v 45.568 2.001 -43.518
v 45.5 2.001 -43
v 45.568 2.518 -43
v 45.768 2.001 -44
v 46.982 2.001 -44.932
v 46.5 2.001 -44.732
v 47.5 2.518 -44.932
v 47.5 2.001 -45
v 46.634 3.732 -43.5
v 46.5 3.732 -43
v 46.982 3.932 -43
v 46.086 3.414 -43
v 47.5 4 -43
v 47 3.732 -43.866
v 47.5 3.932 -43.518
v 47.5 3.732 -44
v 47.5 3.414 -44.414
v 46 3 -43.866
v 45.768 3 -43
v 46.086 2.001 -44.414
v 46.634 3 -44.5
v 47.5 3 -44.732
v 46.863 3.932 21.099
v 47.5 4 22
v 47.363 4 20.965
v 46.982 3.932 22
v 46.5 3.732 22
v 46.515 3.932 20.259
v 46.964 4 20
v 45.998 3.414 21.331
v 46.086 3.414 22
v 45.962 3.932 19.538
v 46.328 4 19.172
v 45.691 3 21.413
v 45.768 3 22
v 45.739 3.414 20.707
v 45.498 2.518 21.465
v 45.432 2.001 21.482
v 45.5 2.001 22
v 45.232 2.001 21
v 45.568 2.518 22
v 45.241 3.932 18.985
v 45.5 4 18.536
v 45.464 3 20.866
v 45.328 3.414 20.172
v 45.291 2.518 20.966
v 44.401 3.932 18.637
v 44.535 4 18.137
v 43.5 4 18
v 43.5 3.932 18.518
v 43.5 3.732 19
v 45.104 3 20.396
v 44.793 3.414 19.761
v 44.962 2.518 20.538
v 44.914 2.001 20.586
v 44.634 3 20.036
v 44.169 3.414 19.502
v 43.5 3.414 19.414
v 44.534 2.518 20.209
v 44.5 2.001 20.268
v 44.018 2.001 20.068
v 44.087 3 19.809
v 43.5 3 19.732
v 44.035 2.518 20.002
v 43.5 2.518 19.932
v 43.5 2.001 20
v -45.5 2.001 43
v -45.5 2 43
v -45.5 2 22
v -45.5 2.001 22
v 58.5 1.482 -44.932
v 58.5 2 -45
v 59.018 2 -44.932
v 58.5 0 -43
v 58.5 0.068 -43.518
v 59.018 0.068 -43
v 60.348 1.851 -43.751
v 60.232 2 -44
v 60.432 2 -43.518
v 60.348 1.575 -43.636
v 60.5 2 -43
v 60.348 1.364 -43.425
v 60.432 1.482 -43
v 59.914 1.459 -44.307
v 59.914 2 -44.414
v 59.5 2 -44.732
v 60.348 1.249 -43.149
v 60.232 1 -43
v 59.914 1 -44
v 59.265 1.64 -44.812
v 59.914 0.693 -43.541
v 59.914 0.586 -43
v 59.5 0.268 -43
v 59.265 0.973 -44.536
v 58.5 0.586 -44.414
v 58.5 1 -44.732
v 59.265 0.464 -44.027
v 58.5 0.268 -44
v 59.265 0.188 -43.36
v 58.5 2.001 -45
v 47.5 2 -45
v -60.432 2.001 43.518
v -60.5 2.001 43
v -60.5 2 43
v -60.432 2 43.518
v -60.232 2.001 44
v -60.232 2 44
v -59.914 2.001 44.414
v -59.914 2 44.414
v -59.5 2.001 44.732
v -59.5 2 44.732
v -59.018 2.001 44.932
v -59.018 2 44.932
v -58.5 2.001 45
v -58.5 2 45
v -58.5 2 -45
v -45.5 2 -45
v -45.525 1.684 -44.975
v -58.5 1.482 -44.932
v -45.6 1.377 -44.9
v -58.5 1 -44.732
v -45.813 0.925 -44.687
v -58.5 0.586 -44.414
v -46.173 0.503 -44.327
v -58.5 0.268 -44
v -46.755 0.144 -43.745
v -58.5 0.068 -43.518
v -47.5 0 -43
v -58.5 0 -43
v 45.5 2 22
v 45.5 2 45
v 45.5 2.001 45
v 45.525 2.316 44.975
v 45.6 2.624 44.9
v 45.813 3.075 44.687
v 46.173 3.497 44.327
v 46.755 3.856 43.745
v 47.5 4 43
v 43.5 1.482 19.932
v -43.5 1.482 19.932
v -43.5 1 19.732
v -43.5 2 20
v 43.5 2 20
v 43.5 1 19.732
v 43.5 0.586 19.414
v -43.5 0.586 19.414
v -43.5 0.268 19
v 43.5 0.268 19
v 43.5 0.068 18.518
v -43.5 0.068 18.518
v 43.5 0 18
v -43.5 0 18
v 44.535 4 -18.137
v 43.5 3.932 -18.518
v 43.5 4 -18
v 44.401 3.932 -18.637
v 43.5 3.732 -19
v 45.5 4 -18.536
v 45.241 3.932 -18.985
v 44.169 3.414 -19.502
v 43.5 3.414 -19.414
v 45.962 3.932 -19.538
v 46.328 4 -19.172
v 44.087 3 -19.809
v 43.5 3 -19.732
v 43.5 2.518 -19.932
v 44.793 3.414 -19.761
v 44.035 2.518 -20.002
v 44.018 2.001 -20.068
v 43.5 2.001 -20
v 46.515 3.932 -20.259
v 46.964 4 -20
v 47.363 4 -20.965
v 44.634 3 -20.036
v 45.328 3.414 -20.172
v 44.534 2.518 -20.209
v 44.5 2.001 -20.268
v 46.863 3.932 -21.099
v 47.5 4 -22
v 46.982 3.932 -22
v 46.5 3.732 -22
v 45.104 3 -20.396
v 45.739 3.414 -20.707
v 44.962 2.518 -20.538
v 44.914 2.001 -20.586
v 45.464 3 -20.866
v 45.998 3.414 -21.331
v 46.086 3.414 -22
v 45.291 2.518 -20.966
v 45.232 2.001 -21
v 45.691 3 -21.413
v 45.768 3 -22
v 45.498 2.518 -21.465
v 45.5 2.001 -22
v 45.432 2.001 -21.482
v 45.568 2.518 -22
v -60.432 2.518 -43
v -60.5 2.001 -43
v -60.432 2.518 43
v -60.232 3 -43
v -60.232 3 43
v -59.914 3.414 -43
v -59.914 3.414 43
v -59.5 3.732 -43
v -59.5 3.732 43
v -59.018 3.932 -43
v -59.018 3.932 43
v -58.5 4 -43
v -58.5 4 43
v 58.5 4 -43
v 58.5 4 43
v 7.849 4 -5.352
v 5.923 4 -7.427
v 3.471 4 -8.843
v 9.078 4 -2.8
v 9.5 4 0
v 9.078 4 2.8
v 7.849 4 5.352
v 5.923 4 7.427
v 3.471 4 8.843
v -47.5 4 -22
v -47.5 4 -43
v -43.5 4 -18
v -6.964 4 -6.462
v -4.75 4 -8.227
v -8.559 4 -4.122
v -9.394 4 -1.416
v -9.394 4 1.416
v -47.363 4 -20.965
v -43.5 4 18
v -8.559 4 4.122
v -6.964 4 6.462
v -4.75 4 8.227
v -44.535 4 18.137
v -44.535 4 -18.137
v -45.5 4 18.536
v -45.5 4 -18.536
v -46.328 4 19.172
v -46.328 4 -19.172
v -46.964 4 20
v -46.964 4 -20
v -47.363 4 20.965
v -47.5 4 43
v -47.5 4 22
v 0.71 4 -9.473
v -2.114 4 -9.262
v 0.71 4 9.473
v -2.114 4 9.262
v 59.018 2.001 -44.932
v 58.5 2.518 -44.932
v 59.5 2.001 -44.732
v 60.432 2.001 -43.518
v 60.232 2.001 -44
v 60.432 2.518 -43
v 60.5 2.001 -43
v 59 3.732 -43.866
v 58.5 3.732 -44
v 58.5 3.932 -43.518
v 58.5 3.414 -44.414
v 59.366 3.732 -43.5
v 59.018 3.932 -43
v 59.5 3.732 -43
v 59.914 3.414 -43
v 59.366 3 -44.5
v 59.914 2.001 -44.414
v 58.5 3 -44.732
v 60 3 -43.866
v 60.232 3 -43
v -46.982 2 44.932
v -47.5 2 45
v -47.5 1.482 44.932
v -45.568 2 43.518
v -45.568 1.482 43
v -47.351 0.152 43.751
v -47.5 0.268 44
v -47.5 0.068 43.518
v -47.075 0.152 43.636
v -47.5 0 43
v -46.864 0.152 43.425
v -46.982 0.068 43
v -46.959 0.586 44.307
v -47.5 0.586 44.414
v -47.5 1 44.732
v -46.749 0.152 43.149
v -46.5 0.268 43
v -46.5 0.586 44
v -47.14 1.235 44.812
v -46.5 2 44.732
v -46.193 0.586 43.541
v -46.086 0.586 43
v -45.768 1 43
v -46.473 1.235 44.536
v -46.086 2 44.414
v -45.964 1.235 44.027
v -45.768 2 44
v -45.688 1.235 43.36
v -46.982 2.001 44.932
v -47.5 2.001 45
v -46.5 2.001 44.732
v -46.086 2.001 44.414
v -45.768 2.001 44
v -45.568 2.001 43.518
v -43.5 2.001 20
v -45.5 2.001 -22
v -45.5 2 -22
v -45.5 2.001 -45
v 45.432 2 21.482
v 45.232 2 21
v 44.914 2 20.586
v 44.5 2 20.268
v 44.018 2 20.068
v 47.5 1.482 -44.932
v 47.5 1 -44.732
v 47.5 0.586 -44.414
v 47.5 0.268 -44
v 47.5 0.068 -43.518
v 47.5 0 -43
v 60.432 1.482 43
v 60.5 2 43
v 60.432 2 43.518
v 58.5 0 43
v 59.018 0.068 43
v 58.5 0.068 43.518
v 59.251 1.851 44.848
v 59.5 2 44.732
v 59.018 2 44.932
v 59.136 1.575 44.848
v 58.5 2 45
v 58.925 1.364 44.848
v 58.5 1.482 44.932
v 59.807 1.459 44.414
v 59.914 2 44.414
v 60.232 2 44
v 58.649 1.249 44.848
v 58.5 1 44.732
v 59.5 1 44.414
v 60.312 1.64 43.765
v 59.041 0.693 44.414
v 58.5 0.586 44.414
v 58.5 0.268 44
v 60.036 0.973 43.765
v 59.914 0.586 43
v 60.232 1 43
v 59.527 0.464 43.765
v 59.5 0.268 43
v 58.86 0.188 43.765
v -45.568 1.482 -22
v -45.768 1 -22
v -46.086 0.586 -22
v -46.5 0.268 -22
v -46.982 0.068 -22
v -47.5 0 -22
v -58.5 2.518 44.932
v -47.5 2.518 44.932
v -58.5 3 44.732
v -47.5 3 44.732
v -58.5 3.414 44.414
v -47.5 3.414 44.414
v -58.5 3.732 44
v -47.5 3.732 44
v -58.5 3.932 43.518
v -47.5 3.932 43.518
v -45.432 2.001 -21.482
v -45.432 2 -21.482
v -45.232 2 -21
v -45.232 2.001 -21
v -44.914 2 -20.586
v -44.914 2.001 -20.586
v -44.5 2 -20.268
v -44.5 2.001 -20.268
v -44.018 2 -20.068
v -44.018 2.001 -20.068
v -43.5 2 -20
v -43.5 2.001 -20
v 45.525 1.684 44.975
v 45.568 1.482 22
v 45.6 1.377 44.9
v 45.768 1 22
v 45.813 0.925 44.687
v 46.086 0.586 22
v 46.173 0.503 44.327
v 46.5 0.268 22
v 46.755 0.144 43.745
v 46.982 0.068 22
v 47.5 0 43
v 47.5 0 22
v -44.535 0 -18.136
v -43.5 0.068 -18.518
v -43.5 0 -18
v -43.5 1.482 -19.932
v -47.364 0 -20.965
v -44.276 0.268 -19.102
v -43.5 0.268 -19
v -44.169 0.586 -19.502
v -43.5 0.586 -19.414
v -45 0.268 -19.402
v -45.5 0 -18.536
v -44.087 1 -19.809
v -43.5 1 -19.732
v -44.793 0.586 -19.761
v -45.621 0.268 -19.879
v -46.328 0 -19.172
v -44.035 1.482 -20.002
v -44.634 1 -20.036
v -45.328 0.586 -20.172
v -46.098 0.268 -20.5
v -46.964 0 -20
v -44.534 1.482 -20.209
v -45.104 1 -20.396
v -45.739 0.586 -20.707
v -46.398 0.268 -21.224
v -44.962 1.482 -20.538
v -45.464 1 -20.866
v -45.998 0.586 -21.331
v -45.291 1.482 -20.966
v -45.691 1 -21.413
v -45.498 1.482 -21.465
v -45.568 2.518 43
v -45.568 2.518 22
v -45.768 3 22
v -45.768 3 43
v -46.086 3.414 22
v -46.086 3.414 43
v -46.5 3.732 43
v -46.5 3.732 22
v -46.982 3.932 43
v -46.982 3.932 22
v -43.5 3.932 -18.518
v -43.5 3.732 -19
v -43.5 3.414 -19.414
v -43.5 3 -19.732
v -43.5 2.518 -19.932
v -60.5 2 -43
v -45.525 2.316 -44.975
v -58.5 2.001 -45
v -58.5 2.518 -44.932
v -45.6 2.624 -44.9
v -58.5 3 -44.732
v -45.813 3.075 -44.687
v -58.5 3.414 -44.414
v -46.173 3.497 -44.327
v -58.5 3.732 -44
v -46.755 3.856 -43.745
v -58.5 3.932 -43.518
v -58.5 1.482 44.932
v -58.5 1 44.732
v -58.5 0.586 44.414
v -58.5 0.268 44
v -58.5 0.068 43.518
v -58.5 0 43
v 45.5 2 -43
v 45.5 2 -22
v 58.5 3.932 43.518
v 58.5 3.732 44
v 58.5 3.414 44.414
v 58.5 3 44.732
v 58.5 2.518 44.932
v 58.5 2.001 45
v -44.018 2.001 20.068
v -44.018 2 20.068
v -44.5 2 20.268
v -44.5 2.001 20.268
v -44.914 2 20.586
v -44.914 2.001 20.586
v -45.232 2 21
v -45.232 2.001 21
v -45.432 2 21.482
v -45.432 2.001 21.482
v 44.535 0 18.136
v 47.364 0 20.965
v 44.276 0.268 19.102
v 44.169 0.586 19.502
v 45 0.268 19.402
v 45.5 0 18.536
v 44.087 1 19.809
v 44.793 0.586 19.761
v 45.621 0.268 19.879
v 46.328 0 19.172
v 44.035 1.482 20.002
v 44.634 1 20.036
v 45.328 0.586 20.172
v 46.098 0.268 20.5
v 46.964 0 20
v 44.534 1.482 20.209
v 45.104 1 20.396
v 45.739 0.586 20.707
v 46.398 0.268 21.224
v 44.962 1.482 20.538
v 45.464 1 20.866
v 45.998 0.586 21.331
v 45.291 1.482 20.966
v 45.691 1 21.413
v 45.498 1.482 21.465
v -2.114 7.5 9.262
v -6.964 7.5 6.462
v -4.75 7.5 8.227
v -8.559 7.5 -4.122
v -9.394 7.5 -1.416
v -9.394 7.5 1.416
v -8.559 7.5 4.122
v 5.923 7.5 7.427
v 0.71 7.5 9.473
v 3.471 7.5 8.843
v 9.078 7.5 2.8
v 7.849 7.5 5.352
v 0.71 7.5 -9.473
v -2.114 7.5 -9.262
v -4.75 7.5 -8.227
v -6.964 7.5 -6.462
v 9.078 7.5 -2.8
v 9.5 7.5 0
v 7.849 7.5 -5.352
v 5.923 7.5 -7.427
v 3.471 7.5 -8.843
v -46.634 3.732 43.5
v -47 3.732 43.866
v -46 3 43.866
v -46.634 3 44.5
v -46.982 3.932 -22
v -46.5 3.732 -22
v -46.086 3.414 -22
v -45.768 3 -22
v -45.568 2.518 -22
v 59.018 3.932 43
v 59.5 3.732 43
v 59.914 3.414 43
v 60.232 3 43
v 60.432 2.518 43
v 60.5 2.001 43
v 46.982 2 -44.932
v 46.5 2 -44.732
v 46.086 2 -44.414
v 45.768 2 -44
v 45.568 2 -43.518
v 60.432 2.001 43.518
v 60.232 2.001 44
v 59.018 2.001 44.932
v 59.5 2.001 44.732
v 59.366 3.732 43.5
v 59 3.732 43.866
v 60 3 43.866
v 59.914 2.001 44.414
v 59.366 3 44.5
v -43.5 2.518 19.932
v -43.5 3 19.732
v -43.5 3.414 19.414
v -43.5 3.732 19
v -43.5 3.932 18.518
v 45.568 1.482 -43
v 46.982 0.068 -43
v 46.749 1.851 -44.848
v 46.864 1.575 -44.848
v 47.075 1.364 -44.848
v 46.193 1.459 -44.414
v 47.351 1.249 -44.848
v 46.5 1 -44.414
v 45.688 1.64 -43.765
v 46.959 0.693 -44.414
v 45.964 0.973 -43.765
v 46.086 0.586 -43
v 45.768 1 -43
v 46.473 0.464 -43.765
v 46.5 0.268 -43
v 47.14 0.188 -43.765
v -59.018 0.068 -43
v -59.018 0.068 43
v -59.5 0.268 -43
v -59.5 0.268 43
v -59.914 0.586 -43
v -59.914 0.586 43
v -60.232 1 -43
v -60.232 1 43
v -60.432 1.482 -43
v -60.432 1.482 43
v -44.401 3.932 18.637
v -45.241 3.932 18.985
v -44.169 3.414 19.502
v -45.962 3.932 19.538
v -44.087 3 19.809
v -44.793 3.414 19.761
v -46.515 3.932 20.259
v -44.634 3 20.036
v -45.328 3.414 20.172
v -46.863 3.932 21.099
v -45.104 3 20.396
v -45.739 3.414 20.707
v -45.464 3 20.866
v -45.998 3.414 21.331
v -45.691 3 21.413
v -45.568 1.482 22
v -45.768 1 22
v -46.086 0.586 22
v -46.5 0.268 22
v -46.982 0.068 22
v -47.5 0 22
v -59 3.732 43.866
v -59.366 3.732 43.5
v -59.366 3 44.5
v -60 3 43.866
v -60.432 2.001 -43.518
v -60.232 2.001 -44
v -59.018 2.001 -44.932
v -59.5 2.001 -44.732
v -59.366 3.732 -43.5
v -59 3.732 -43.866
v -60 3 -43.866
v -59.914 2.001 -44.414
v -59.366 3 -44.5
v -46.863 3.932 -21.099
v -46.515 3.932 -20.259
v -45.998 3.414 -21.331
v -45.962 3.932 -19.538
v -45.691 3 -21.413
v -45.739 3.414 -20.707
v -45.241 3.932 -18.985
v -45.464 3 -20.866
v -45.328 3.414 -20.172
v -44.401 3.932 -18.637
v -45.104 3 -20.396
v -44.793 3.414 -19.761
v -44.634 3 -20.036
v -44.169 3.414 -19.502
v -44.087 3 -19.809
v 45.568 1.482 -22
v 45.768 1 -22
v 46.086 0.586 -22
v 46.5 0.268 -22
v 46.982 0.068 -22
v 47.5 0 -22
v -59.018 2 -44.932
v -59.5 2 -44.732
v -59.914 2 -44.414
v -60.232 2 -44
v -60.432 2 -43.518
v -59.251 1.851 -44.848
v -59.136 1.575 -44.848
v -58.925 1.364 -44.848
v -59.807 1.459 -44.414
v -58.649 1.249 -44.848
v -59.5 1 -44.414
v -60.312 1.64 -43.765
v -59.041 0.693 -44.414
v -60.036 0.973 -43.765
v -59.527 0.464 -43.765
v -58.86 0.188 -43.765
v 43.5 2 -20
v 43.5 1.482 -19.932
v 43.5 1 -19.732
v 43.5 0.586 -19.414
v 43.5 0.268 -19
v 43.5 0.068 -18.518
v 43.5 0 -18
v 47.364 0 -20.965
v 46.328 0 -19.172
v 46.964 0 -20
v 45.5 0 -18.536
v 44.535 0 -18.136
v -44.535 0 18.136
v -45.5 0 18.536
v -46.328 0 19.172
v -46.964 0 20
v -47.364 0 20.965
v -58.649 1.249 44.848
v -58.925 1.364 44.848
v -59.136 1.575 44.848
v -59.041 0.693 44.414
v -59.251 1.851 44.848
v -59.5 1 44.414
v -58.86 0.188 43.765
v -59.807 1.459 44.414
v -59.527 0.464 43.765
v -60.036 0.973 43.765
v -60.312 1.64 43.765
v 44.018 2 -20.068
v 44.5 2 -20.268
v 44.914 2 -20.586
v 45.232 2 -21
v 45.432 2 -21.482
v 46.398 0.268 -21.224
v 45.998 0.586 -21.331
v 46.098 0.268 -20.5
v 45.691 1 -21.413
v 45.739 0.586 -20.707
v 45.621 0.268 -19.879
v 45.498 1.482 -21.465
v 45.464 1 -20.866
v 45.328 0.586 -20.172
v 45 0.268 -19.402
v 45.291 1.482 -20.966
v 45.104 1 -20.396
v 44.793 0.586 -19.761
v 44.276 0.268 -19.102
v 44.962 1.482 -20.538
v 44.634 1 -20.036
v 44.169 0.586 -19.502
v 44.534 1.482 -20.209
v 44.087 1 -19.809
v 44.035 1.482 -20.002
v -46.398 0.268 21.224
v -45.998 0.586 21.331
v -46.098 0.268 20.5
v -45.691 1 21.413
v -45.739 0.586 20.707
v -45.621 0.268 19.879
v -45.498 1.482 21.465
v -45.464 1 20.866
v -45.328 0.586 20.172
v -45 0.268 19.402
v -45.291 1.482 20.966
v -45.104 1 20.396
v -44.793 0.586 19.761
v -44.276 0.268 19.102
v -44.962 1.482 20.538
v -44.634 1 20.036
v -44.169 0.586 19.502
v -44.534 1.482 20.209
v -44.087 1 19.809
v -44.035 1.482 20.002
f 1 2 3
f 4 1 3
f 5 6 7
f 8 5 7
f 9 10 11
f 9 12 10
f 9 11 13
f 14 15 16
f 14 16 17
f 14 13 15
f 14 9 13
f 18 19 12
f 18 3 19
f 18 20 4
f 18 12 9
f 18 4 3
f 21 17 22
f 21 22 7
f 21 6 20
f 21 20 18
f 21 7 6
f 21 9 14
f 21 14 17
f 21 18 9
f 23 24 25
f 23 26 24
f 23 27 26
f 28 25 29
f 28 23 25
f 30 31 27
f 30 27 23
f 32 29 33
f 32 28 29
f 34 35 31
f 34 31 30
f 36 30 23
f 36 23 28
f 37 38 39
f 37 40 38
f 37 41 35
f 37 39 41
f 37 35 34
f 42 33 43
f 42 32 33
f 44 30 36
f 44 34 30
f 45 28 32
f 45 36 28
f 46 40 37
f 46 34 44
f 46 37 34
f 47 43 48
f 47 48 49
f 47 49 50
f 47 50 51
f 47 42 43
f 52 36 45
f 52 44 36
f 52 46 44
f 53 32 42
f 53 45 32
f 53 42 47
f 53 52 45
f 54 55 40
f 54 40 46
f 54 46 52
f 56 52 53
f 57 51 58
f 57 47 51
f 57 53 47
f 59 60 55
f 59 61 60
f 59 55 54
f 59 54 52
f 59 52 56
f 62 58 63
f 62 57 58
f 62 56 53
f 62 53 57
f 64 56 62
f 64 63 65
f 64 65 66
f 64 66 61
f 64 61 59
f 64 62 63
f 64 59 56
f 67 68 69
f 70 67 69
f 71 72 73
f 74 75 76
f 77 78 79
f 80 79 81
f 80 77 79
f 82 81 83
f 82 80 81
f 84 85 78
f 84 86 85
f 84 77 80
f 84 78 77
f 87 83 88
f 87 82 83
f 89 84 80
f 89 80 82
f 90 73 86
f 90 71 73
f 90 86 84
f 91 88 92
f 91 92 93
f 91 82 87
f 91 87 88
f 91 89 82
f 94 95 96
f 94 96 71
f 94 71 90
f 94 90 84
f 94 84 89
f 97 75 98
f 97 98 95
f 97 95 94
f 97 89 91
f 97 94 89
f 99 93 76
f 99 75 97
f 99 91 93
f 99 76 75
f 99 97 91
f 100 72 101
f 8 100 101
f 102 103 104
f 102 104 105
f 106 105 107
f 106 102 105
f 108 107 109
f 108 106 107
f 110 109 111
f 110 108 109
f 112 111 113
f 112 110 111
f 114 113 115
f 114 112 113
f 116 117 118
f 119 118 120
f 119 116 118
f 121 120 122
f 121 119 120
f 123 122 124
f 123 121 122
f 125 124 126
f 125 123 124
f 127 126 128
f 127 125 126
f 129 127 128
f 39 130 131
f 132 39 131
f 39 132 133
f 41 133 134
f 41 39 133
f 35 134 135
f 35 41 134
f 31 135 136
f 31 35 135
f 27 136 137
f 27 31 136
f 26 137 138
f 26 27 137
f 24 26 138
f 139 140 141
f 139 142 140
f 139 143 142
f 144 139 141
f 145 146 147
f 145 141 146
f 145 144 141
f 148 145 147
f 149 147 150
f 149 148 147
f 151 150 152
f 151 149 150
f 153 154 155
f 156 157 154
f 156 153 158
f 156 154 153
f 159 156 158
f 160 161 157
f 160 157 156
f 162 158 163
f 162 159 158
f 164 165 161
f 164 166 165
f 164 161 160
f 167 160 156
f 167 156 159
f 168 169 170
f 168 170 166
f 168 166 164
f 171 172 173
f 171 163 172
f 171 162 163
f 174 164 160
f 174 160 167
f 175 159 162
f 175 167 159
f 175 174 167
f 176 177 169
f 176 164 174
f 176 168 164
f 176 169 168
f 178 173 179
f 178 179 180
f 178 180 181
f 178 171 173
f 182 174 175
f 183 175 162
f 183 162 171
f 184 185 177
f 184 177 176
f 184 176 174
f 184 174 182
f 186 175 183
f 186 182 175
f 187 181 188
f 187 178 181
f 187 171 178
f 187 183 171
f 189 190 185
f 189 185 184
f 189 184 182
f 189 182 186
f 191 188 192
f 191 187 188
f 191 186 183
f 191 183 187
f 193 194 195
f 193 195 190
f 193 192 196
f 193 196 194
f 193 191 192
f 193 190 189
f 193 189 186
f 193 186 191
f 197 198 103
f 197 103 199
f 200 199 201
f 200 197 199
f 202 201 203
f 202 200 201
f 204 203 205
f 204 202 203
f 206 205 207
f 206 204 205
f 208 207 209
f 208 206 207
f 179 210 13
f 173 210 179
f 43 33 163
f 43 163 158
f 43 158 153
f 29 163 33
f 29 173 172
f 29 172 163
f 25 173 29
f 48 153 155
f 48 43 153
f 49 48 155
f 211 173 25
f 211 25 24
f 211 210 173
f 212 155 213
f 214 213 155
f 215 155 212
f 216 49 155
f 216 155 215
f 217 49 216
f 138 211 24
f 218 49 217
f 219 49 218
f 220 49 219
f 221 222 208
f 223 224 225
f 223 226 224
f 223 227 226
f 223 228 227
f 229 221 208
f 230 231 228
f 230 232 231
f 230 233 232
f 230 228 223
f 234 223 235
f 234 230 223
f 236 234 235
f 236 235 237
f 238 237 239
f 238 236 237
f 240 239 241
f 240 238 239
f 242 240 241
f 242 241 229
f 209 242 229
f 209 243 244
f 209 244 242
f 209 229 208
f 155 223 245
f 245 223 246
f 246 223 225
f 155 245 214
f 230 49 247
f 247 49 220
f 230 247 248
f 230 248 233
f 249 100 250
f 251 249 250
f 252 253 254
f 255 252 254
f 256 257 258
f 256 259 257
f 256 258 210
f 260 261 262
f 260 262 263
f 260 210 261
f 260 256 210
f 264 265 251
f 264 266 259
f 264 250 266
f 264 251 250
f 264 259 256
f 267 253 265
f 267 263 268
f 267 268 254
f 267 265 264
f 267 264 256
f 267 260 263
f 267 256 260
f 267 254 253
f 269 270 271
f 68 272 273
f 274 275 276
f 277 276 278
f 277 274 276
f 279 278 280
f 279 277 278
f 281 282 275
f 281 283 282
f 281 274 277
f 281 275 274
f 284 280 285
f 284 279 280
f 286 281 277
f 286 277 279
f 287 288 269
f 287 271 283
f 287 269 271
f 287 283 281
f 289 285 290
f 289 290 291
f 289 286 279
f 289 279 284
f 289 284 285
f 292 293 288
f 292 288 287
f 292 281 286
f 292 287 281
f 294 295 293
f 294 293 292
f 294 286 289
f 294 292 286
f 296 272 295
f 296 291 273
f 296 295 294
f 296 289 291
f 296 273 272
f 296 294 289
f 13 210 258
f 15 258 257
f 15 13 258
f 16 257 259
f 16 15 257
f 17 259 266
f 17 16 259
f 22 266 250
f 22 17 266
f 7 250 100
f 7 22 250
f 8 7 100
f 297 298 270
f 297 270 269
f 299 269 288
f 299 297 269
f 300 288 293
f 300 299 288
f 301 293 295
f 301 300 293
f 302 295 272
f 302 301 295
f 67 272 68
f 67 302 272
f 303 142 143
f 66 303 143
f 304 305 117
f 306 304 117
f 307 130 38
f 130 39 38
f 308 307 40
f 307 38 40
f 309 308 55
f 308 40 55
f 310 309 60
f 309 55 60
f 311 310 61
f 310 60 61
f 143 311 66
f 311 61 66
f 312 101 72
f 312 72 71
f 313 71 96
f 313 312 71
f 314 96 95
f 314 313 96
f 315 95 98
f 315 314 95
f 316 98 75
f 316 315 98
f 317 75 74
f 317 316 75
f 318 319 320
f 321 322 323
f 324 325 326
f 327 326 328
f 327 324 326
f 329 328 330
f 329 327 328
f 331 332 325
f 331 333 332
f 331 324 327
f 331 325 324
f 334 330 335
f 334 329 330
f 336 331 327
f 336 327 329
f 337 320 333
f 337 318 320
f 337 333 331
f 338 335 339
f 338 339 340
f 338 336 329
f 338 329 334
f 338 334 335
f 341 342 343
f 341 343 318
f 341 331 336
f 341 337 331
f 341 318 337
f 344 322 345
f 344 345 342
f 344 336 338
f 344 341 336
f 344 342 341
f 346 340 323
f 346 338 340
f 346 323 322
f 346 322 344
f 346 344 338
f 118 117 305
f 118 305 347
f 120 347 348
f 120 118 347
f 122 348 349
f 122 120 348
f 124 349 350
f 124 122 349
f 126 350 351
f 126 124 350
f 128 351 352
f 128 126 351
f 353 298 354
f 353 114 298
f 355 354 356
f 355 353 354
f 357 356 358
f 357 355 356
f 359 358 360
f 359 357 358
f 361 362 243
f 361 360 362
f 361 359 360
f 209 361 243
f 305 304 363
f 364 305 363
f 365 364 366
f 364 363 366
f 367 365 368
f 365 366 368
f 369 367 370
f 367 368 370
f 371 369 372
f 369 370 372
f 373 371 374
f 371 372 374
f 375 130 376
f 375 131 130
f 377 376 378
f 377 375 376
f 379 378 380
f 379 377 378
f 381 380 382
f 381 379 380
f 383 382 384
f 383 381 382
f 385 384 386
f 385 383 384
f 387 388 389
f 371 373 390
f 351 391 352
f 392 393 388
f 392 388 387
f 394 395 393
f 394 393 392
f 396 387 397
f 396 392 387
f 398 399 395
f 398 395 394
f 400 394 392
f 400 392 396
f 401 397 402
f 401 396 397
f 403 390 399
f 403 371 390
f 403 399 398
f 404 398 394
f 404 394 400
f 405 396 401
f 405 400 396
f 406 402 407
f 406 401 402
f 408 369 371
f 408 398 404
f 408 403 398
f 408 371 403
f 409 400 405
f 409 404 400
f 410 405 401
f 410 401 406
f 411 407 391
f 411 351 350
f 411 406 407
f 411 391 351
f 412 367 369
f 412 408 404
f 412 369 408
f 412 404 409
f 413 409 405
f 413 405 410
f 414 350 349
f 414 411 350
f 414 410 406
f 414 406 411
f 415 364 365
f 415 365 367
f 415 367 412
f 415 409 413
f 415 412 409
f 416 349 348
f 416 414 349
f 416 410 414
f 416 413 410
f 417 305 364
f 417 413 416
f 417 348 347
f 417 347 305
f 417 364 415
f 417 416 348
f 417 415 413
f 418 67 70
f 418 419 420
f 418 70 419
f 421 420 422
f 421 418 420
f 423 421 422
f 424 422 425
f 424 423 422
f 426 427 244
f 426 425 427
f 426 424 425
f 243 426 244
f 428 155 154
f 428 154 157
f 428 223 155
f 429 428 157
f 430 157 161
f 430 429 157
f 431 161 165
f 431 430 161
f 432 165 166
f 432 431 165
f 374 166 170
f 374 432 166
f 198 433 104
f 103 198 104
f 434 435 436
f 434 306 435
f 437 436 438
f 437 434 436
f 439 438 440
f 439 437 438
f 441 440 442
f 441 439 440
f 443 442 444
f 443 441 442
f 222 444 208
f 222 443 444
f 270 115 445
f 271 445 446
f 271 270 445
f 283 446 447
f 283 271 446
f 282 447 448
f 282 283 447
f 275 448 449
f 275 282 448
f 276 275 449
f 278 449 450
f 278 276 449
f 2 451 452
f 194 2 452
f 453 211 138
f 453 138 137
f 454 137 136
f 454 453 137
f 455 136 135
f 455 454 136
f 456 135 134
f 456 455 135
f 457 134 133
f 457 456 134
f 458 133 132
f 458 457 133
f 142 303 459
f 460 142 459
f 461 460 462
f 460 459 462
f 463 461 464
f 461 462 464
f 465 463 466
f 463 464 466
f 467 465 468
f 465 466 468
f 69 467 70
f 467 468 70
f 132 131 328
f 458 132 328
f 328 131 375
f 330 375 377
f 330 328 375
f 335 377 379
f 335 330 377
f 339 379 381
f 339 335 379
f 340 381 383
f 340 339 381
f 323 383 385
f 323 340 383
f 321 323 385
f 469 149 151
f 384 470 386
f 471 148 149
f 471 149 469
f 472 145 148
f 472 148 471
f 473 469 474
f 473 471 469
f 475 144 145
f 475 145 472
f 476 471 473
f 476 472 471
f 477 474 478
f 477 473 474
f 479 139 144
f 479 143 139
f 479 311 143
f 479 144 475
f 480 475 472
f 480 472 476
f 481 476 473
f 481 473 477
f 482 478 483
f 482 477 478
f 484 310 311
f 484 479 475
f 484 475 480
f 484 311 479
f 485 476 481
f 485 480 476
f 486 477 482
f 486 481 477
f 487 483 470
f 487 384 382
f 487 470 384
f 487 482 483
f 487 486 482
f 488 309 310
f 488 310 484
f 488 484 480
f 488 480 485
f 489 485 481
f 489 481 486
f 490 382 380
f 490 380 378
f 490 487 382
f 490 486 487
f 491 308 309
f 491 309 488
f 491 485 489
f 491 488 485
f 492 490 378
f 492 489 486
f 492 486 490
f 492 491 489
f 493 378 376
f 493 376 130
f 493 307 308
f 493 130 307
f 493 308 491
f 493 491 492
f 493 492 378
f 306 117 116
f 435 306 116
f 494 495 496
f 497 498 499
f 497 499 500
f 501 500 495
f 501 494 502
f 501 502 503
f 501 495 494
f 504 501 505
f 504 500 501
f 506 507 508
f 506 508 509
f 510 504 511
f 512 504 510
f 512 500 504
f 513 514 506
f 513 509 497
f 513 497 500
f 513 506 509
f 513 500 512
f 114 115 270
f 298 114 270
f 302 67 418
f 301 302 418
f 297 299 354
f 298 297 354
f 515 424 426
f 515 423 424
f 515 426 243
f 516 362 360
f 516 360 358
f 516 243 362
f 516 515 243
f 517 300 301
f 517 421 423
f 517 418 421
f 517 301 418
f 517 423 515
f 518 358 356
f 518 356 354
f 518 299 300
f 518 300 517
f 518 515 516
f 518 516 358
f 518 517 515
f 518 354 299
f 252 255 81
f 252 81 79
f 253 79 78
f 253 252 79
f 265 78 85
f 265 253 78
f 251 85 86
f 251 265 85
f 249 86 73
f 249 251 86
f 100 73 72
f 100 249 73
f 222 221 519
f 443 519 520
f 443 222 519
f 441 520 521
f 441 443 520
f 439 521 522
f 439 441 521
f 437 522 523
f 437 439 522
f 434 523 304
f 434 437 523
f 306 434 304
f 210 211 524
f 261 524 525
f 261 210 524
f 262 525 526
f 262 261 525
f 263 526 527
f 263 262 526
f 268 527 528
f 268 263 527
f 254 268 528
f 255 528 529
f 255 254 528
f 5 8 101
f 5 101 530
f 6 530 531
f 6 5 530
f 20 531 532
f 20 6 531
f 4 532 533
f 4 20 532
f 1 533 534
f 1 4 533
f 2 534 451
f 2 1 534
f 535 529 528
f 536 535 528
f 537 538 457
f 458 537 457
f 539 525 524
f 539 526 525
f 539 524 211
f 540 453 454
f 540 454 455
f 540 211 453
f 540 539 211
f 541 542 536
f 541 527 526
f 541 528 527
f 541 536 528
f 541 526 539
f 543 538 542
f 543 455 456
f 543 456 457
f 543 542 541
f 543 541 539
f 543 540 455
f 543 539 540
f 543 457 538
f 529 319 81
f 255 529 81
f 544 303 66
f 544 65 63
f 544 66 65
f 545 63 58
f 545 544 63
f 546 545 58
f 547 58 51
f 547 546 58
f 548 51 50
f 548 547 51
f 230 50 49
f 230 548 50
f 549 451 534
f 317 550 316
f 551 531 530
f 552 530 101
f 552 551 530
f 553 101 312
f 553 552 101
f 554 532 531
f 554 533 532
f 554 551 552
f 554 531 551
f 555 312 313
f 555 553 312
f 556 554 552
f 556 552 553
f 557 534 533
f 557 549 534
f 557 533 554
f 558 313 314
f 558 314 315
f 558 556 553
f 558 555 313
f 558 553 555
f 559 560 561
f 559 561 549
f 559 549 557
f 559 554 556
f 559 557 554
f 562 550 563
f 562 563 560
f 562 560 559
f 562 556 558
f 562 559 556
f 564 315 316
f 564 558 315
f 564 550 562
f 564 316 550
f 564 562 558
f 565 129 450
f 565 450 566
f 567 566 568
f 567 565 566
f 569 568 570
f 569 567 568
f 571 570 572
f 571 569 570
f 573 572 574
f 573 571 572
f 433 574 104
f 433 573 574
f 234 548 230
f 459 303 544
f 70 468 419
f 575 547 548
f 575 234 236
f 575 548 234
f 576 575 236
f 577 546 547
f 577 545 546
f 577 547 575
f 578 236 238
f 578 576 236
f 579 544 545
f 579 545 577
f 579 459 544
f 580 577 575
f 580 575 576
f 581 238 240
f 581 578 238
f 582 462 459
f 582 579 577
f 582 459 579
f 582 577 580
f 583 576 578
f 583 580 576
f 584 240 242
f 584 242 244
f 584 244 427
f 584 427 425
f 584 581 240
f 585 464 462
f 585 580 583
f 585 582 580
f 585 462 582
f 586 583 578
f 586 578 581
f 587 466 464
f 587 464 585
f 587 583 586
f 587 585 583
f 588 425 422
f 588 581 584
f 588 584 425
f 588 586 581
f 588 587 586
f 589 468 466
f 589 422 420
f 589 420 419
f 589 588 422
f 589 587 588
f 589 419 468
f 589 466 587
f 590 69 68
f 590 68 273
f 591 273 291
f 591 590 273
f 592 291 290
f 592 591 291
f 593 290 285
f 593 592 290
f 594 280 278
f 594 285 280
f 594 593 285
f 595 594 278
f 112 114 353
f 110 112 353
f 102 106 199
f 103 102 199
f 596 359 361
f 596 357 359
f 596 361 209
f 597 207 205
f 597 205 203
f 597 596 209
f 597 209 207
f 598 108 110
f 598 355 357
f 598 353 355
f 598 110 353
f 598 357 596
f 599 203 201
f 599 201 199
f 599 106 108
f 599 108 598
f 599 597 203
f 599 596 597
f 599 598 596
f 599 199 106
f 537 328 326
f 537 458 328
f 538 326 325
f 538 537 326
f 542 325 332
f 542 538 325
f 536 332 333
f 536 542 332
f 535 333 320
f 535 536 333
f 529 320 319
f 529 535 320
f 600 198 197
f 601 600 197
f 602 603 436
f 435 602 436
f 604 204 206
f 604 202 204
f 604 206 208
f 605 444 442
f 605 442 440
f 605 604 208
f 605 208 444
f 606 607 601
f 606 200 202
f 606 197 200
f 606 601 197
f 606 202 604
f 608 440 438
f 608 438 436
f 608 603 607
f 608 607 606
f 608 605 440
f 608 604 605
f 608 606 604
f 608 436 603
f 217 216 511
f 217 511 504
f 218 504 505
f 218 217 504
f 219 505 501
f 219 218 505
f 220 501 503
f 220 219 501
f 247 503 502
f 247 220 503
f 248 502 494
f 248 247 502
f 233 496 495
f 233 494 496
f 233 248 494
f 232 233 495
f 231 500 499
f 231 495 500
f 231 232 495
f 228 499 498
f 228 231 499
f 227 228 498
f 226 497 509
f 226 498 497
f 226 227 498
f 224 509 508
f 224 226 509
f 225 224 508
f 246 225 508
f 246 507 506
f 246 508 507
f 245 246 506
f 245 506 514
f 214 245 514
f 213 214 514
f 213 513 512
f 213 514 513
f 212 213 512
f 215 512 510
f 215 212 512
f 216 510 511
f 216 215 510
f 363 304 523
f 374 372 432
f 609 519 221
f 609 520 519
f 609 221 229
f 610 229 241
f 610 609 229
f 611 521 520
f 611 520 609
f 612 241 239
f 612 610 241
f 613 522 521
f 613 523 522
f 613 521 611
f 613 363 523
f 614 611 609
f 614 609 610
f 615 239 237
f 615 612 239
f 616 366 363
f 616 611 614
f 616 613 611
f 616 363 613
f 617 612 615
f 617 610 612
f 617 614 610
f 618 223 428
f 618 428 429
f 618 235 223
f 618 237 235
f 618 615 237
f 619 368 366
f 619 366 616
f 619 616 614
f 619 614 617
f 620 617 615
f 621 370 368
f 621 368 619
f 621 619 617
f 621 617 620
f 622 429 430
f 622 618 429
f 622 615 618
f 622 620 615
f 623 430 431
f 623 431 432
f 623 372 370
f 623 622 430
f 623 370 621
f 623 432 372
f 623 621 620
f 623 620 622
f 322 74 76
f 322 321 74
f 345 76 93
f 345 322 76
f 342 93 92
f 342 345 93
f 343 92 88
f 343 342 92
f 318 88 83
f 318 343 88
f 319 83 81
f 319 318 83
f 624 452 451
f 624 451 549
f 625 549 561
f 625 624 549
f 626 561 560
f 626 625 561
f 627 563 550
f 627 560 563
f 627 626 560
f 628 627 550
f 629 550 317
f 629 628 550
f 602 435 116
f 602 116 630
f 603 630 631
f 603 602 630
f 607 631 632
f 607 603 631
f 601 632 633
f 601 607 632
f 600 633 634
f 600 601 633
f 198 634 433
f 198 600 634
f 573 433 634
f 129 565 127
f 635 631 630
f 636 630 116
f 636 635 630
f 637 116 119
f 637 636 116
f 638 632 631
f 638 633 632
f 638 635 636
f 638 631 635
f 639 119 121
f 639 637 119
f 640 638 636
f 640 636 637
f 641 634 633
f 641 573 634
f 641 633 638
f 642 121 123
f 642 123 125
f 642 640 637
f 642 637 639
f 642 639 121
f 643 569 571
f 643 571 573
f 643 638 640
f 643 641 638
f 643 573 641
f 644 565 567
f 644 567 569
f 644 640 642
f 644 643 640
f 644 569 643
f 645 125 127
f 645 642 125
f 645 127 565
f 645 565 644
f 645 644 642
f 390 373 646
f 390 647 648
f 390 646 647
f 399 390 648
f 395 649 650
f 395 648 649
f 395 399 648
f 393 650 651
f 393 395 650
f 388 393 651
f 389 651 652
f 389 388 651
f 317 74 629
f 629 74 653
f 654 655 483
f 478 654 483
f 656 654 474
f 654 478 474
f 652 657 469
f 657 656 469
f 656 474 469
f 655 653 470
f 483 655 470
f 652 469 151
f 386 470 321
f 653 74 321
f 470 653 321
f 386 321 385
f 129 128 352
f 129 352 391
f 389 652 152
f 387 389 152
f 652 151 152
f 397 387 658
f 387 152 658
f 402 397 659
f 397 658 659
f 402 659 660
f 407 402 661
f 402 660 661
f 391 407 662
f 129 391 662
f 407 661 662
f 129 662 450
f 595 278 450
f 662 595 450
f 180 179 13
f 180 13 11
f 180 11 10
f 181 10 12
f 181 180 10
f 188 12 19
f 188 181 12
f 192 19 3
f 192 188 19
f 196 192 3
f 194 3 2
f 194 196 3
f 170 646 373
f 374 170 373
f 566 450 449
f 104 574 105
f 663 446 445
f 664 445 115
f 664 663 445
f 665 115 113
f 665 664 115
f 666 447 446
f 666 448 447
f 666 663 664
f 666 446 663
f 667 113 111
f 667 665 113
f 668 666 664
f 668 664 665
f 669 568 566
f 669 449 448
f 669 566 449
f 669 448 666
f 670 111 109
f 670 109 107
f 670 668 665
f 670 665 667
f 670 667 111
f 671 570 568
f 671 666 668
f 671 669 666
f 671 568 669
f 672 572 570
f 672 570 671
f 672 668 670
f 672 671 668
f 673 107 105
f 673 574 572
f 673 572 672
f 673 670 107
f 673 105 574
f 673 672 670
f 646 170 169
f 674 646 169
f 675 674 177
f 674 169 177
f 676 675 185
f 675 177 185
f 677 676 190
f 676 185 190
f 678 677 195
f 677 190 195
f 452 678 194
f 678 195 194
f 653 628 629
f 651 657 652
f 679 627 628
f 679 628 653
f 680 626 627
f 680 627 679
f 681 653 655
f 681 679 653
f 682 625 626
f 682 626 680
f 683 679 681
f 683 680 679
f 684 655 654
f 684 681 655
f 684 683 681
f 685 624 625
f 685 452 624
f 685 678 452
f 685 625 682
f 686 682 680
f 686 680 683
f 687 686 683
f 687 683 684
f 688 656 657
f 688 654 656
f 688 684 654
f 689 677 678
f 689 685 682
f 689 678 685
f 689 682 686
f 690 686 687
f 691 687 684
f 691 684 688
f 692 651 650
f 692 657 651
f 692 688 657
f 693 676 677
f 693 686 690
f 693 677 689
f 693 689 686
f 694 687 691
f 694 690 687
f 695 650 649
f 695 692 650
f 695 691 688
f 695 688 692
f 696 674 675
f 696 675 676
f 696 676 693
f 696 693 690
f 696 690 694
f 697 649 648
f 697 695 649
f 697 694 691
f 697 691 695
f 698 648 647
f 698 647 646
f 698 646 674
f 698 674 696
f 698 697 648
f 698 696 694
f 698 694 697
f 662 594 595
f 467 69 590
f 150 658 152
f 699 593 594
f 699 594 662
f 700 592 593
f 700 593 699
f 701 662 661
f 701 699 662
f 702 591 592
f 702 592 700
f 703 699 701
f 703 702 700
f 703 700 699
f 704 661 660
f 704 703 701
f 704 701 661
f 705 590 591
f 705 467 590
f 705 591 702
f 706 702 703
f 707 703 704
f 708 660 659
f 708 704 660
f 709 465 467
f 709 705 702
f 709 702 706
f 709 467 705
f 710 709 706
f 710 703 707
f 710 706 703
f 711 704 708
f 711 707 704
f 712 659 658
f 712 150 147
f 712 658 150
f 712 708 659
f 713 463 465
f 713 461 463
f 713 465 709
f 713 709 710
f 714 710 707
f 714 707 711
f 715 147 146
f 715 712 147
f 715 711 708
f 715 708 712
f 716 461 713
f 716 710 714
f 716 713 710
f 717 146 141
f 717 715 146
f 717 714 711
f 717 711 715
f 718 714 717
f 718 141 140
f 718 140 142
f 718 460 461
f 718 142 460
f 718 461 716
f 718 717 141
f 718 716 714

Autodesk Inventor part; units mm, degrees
ref_plane "YZ Plane" through (0, 0, 0) normal (1, 0, 0) x (0, 1, 0)
ref_plane "XZ Plane" through (0, 0, 0) normal (0, 1, 0) x (-1, 0, 0)
ref_plane "XY Plane" through (0, 0, 0) normal (0, 0, 1) x (1, 0, 0)
sketch "Sketch1" plane through (0, 0, 0) normal (0, 1, 0) x (-1, 0, 0)
  line L0 (-45.5, -20) -> (45.5, -20)
  line L1 (60.5, -20) -> (60.5, 20)
  line L2 (45.5, 20) -> (-45.5, 20)
  line L3 (-60.5, 20) -> (-60.5, -20)
  line L4 (-60.5, -20) -> (60.5, 20) construction
  line L5 (60.5, -20) -> (-60.5, 20) construction
  line L6 (-60.5, -45) -> (60.5, -45) construction
  line L7 (60.5, -45) -> (60.5, 45) construction
  line L8 (60.5, 45) -> (-60.5, 45) construction
  line L9 (-60.5, 45) -> (-60.5, -45) construction
  line L10 (-60.5, -45) -> (60.5, 45) construction
  line L11 (60.5, -45) -> (-60.5, 45) construction
  line L12 (60.5, 45) -> (45.5, 45)
  line L13 (45.5, -45) -> (60.5, -45)
  line L14 (60.5, -45) -> (60.5, 45)
  line L15 (-60.5, -45) -> (-45.5, -45)
  line L16 (-45.5, 45) -> (-60.5, 45)
  line L17 (-60.5, 45) -> (-60.5, -45)
  line L18 (-45.5, -45) -> (-45.5, -20)
  line L19 (-45.5, 20) -> (-45.5, 45)
  line L20 (45.5, 45) -> (45.5, 20)
  line L21 (45.5, -20) -> (45.5, -45)
  point P0 (0, 0)
  dimension "d0" = 121
  dimension "d1" = 40
  dimension "d2" = 121
  dimension "d3" = 90
  dimension "d4" = 15
  dimension "d5" = 15
extrude "Extrusion1" add sketch "Sketch1" along normal blind 4
sketch "Sketch2" plane through (0, 4, 0) normal (0, 1, 0) x (1, 0, 0)
  circle A0 centre (0, 0) radius 9.5
  dimension "d8" = 19
extrude "Extrusion2" add sketch "Sketch2" along normal blind 3.5
fillet "Fillet1" radius 2 22 edges at (-60.5, 0, 0) (-53, 0, -45) (-45.5, 0, -32.5) (0, 0, -20) (0, 0, 20) (45.5, 0, -32.5) (53, 0, -45) (60.5, 0, 0) (53, 0, 45) (45.5, 0, 32.5) (60.5, 2, 45) (60.5, 2, -45) (45.5, 2, -45) (45.5, 2, -20) (45.5, 2, 20) (-45.5, 2, 20) (-45.5, 2, -20) (-60.5, 2, -45) (-60.5, 2, 45) (-45.5, 2, 45) (-53, 0, 45) (-45.5, 0, 32.5)
fillet "Fillet2" radius 2 18 edges at (-59.9142, 4, -44.4142) (-60.5, 4, 0) (-59.9142, 4, 44.4142) (-53, 4, 45) (-46.0858, 4, 44.4142) (-45.5, 4, 32.5) (0, 4, 20) (45.5, 4, 33.5) (-52, 4, -45) (0, 4, -20) (45.5, 4, -32.5) (46.0858, 4, -44.4142) (53, 4, -45) (59.9142, 4, -44.4142) (60.5, 4, 0) (59.9142, 4, 44.4142) (52, 4, 45) (-45.5, 4, -33.5)
properties part number "SujetorPanel"
